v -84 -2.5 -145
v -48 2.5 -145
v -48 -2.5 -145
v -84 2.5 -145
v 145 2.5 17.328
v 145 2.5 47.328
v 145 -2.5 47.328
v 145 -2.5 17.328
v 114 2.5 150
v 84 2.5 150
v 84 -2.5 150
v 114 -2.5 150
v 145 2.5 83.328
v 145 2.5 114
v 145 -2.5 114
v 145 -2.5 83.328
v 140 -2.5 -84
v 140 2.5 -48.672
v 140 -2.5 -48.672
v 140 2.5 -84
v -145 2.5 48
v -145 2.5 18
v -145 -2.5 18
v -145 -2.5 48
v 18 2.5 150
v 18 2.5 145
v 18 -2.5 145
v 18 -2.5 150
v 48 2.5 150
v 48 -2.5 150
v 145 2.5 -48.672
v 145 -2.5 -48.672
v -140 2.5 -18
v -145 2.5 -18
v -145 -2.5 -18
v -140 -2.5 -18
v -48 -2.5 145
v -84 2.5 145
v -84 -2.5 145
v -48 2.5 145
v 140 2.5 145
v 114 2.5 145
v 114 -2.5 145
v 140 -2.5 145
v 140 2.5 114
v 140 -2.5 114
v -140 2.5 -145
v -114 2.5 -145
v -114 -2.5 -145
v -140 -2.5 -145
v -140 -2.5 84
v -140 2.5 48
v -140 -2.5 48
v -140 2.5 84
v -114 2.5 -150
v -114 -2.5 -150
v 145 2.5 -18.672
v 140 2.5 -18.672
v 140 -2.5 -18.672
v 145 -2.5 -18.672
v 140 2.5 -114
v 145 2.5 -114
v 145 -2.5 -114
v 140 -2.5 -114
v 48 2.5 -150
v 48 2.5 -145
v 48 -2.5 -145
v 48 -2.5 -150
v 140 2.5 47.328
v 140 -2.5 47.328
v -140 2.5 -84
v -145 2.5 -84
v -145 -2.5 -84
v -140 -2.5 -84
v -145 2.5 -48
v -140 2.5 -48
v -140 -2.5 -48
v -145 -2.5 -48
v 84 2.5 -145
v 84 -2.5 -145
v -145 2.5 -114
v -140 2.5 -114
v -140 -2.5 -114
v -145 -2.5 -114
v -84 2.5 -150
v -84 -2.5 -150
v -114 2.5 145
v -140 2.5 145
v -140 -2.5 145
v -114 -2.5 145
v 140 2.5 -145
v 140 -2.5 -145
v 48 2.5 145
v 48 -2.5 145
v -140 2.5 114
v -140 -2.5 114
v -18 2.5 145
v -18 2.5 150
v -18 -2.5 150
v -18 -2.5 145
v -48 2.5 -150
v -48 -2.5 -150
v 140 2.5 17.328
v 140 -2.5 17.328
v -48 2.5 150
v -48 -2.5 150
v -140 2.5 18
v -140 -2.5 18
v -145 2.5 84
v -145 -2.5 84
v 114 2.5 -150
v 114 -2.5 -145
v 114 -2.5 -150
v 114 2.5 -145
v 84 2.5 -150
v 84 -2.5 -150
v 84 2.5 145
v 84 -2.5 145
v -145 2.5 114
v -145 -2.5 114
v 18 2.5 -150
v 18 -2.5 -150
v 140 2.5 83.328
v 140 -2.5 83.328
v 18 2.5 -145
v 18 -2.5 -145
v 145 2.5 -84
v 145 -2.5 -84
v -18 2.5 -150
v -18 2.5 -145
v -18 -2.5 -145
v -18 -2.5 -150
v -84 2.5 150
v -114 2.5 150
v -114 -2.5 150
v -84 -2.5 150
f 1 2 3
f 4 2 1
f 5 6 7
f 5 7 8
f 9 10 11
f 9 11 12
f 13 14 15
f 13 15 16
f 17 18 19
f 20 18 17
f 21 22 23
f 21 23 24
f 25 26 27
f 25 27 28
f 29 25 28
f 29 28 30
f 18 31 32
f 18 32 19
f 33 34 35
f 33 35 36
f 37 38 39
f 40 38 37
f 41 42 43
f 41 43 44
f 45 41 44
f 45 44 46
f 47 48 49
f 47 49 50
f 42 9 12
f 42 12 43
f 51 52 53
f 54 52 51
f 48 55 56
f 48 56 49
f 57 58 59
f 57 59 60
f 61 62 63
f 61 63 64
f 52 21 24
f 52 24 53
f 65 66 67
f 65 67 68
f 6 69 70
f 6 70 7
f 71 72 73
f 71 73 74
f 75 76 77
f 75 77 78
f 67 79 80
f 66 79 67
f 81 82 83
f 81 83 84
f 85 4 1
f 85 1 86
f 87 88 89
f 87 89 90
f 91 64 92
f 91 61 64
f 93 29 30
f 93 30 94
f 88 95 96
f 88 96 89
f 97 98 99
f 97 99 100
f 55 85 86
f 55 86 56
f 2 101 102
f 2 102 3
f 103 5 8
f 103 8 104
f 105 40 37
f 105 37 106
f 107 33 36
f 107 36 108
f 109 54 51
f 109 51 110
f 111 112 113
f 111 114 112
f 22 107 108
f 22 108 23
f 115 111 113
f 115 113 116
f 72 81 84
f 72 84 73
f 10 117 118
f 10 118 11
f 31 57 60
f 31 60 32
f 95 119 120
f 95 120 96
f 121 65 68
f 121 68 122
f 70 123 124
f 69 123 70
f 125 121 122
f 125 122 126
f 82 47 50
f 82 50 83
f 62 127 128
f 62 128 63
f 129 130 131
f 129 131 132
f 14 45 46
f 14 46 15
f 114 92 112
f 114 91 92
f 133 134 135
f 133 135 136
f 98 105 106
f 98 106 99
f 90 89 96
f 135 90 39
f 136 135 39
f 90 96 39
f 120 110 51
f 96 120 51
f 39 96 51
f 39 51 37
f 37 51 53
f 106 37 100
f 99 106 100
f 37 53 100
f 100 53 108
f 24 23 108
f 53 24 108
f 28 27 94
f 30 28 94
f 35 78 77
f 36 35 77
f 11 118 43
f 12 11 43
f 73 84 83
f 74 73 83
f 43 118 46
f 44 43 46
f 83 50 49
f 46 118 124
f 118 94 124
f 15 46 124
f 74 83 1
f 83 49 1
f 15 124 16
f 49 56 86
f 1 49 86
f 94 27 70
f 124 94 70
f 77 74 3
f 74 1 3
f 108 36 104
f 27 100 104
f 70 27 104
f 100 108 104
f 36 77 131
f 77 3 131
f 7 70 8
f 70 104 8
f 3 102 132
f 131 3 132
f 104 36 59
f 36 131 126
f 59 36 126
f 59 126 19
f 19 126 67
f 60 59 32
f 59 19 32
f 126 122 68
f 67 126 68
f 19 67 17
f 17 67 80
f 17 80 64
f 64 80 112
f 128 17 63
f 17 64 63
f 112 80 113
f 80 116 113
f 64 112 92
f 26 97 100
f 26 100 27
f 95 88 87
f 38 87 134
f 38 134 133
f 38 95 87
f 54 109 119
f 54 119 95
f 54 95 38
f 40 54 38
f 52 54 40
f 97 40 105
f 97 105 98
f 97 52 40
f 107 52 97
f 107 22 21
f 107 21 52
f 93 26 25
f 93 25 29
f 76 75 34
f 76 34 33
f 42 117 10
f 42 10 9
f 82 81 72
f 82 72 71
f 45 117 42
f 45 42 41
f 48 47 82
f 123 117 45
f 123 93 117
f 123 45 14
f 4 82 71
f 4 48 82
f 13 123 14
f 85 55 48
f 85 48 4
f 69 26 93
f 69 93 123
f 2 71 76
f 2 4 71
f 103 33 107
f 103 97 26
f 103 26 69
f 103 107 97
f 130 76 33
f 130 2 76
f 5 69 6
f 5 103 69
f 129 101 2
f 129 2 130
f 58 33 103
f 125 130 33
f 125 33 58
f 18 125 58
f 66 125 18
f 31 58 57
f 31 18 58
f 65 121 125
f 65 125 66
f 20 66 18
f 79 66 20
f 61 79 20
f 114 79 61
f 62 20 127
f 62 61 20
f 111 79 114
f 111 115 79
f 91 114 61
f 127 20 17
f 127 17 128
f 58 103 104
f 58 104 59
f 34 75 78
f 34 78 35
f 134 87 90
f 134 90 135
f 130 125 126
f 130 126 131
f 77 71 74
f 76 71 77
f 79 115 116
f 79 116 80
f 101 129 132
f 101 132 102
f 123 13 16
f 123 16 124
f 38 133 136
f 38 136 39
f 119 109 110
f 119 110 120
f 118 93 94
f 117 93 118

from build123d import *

# Parameters (mm, degrees)
BOSS_EXTRUDE1_DEPTH = 2.5


with BuildPart() as part:
    # Sketch1 → Boss-Extrude1 (new, symmetric)
    with BuildSketch(Plane(origin=(0, 0, 0), x_dir=(1, 0, 0), z_dir=(0, 1, 0))):
        Polygon((114, 145), (114, 150), (84, 150), (84, 145), (48, 145), (48, 150), (18, 150), (18, 145), (-18, 145), (-18, 150), (-48, 150), (-48, 145), (-84, 145), (-84, 150), (-114, 150), (-114, 145), (-140, 145), (-140, 114), (-145, 114), (-145, 84), (-140, 84), (-140, 48), (-145, 48), (-145, 18), (-140, 18), (-140, -18), (-145, -18), (-145, -48), (-140, -48), (-140, -84), (-145, -84), (-145, -114), (-140, -114), (-140, -145), (-114, -145), (-114, -150), (-84, -150), (-84, -145), (-48, -145), (-48, -150), (-18, -150), (-18, -145), (18, -145), (18, -150), (48, -150), (48, -145), (84, -145), (84, -150), (114, -150), (114, -145), (140, -145), (140, -114), (145, -114), (145, -83.328035024), (140, -83.328035024), (140, -47.328035024), (145, -47.328035024), (145, -17.328035024), (140, -17.328035024), (140, 18.671964976), (145, 18.671964976), (145, 48.671964976), (140, 48.671964976), (140, 84), (145, 84), (145, 114), (140, 114), (140, 145), align=None)
    extrude(amount=BOSS_EXTRUDE1_DEPTH, both=True)


solid = part.part
